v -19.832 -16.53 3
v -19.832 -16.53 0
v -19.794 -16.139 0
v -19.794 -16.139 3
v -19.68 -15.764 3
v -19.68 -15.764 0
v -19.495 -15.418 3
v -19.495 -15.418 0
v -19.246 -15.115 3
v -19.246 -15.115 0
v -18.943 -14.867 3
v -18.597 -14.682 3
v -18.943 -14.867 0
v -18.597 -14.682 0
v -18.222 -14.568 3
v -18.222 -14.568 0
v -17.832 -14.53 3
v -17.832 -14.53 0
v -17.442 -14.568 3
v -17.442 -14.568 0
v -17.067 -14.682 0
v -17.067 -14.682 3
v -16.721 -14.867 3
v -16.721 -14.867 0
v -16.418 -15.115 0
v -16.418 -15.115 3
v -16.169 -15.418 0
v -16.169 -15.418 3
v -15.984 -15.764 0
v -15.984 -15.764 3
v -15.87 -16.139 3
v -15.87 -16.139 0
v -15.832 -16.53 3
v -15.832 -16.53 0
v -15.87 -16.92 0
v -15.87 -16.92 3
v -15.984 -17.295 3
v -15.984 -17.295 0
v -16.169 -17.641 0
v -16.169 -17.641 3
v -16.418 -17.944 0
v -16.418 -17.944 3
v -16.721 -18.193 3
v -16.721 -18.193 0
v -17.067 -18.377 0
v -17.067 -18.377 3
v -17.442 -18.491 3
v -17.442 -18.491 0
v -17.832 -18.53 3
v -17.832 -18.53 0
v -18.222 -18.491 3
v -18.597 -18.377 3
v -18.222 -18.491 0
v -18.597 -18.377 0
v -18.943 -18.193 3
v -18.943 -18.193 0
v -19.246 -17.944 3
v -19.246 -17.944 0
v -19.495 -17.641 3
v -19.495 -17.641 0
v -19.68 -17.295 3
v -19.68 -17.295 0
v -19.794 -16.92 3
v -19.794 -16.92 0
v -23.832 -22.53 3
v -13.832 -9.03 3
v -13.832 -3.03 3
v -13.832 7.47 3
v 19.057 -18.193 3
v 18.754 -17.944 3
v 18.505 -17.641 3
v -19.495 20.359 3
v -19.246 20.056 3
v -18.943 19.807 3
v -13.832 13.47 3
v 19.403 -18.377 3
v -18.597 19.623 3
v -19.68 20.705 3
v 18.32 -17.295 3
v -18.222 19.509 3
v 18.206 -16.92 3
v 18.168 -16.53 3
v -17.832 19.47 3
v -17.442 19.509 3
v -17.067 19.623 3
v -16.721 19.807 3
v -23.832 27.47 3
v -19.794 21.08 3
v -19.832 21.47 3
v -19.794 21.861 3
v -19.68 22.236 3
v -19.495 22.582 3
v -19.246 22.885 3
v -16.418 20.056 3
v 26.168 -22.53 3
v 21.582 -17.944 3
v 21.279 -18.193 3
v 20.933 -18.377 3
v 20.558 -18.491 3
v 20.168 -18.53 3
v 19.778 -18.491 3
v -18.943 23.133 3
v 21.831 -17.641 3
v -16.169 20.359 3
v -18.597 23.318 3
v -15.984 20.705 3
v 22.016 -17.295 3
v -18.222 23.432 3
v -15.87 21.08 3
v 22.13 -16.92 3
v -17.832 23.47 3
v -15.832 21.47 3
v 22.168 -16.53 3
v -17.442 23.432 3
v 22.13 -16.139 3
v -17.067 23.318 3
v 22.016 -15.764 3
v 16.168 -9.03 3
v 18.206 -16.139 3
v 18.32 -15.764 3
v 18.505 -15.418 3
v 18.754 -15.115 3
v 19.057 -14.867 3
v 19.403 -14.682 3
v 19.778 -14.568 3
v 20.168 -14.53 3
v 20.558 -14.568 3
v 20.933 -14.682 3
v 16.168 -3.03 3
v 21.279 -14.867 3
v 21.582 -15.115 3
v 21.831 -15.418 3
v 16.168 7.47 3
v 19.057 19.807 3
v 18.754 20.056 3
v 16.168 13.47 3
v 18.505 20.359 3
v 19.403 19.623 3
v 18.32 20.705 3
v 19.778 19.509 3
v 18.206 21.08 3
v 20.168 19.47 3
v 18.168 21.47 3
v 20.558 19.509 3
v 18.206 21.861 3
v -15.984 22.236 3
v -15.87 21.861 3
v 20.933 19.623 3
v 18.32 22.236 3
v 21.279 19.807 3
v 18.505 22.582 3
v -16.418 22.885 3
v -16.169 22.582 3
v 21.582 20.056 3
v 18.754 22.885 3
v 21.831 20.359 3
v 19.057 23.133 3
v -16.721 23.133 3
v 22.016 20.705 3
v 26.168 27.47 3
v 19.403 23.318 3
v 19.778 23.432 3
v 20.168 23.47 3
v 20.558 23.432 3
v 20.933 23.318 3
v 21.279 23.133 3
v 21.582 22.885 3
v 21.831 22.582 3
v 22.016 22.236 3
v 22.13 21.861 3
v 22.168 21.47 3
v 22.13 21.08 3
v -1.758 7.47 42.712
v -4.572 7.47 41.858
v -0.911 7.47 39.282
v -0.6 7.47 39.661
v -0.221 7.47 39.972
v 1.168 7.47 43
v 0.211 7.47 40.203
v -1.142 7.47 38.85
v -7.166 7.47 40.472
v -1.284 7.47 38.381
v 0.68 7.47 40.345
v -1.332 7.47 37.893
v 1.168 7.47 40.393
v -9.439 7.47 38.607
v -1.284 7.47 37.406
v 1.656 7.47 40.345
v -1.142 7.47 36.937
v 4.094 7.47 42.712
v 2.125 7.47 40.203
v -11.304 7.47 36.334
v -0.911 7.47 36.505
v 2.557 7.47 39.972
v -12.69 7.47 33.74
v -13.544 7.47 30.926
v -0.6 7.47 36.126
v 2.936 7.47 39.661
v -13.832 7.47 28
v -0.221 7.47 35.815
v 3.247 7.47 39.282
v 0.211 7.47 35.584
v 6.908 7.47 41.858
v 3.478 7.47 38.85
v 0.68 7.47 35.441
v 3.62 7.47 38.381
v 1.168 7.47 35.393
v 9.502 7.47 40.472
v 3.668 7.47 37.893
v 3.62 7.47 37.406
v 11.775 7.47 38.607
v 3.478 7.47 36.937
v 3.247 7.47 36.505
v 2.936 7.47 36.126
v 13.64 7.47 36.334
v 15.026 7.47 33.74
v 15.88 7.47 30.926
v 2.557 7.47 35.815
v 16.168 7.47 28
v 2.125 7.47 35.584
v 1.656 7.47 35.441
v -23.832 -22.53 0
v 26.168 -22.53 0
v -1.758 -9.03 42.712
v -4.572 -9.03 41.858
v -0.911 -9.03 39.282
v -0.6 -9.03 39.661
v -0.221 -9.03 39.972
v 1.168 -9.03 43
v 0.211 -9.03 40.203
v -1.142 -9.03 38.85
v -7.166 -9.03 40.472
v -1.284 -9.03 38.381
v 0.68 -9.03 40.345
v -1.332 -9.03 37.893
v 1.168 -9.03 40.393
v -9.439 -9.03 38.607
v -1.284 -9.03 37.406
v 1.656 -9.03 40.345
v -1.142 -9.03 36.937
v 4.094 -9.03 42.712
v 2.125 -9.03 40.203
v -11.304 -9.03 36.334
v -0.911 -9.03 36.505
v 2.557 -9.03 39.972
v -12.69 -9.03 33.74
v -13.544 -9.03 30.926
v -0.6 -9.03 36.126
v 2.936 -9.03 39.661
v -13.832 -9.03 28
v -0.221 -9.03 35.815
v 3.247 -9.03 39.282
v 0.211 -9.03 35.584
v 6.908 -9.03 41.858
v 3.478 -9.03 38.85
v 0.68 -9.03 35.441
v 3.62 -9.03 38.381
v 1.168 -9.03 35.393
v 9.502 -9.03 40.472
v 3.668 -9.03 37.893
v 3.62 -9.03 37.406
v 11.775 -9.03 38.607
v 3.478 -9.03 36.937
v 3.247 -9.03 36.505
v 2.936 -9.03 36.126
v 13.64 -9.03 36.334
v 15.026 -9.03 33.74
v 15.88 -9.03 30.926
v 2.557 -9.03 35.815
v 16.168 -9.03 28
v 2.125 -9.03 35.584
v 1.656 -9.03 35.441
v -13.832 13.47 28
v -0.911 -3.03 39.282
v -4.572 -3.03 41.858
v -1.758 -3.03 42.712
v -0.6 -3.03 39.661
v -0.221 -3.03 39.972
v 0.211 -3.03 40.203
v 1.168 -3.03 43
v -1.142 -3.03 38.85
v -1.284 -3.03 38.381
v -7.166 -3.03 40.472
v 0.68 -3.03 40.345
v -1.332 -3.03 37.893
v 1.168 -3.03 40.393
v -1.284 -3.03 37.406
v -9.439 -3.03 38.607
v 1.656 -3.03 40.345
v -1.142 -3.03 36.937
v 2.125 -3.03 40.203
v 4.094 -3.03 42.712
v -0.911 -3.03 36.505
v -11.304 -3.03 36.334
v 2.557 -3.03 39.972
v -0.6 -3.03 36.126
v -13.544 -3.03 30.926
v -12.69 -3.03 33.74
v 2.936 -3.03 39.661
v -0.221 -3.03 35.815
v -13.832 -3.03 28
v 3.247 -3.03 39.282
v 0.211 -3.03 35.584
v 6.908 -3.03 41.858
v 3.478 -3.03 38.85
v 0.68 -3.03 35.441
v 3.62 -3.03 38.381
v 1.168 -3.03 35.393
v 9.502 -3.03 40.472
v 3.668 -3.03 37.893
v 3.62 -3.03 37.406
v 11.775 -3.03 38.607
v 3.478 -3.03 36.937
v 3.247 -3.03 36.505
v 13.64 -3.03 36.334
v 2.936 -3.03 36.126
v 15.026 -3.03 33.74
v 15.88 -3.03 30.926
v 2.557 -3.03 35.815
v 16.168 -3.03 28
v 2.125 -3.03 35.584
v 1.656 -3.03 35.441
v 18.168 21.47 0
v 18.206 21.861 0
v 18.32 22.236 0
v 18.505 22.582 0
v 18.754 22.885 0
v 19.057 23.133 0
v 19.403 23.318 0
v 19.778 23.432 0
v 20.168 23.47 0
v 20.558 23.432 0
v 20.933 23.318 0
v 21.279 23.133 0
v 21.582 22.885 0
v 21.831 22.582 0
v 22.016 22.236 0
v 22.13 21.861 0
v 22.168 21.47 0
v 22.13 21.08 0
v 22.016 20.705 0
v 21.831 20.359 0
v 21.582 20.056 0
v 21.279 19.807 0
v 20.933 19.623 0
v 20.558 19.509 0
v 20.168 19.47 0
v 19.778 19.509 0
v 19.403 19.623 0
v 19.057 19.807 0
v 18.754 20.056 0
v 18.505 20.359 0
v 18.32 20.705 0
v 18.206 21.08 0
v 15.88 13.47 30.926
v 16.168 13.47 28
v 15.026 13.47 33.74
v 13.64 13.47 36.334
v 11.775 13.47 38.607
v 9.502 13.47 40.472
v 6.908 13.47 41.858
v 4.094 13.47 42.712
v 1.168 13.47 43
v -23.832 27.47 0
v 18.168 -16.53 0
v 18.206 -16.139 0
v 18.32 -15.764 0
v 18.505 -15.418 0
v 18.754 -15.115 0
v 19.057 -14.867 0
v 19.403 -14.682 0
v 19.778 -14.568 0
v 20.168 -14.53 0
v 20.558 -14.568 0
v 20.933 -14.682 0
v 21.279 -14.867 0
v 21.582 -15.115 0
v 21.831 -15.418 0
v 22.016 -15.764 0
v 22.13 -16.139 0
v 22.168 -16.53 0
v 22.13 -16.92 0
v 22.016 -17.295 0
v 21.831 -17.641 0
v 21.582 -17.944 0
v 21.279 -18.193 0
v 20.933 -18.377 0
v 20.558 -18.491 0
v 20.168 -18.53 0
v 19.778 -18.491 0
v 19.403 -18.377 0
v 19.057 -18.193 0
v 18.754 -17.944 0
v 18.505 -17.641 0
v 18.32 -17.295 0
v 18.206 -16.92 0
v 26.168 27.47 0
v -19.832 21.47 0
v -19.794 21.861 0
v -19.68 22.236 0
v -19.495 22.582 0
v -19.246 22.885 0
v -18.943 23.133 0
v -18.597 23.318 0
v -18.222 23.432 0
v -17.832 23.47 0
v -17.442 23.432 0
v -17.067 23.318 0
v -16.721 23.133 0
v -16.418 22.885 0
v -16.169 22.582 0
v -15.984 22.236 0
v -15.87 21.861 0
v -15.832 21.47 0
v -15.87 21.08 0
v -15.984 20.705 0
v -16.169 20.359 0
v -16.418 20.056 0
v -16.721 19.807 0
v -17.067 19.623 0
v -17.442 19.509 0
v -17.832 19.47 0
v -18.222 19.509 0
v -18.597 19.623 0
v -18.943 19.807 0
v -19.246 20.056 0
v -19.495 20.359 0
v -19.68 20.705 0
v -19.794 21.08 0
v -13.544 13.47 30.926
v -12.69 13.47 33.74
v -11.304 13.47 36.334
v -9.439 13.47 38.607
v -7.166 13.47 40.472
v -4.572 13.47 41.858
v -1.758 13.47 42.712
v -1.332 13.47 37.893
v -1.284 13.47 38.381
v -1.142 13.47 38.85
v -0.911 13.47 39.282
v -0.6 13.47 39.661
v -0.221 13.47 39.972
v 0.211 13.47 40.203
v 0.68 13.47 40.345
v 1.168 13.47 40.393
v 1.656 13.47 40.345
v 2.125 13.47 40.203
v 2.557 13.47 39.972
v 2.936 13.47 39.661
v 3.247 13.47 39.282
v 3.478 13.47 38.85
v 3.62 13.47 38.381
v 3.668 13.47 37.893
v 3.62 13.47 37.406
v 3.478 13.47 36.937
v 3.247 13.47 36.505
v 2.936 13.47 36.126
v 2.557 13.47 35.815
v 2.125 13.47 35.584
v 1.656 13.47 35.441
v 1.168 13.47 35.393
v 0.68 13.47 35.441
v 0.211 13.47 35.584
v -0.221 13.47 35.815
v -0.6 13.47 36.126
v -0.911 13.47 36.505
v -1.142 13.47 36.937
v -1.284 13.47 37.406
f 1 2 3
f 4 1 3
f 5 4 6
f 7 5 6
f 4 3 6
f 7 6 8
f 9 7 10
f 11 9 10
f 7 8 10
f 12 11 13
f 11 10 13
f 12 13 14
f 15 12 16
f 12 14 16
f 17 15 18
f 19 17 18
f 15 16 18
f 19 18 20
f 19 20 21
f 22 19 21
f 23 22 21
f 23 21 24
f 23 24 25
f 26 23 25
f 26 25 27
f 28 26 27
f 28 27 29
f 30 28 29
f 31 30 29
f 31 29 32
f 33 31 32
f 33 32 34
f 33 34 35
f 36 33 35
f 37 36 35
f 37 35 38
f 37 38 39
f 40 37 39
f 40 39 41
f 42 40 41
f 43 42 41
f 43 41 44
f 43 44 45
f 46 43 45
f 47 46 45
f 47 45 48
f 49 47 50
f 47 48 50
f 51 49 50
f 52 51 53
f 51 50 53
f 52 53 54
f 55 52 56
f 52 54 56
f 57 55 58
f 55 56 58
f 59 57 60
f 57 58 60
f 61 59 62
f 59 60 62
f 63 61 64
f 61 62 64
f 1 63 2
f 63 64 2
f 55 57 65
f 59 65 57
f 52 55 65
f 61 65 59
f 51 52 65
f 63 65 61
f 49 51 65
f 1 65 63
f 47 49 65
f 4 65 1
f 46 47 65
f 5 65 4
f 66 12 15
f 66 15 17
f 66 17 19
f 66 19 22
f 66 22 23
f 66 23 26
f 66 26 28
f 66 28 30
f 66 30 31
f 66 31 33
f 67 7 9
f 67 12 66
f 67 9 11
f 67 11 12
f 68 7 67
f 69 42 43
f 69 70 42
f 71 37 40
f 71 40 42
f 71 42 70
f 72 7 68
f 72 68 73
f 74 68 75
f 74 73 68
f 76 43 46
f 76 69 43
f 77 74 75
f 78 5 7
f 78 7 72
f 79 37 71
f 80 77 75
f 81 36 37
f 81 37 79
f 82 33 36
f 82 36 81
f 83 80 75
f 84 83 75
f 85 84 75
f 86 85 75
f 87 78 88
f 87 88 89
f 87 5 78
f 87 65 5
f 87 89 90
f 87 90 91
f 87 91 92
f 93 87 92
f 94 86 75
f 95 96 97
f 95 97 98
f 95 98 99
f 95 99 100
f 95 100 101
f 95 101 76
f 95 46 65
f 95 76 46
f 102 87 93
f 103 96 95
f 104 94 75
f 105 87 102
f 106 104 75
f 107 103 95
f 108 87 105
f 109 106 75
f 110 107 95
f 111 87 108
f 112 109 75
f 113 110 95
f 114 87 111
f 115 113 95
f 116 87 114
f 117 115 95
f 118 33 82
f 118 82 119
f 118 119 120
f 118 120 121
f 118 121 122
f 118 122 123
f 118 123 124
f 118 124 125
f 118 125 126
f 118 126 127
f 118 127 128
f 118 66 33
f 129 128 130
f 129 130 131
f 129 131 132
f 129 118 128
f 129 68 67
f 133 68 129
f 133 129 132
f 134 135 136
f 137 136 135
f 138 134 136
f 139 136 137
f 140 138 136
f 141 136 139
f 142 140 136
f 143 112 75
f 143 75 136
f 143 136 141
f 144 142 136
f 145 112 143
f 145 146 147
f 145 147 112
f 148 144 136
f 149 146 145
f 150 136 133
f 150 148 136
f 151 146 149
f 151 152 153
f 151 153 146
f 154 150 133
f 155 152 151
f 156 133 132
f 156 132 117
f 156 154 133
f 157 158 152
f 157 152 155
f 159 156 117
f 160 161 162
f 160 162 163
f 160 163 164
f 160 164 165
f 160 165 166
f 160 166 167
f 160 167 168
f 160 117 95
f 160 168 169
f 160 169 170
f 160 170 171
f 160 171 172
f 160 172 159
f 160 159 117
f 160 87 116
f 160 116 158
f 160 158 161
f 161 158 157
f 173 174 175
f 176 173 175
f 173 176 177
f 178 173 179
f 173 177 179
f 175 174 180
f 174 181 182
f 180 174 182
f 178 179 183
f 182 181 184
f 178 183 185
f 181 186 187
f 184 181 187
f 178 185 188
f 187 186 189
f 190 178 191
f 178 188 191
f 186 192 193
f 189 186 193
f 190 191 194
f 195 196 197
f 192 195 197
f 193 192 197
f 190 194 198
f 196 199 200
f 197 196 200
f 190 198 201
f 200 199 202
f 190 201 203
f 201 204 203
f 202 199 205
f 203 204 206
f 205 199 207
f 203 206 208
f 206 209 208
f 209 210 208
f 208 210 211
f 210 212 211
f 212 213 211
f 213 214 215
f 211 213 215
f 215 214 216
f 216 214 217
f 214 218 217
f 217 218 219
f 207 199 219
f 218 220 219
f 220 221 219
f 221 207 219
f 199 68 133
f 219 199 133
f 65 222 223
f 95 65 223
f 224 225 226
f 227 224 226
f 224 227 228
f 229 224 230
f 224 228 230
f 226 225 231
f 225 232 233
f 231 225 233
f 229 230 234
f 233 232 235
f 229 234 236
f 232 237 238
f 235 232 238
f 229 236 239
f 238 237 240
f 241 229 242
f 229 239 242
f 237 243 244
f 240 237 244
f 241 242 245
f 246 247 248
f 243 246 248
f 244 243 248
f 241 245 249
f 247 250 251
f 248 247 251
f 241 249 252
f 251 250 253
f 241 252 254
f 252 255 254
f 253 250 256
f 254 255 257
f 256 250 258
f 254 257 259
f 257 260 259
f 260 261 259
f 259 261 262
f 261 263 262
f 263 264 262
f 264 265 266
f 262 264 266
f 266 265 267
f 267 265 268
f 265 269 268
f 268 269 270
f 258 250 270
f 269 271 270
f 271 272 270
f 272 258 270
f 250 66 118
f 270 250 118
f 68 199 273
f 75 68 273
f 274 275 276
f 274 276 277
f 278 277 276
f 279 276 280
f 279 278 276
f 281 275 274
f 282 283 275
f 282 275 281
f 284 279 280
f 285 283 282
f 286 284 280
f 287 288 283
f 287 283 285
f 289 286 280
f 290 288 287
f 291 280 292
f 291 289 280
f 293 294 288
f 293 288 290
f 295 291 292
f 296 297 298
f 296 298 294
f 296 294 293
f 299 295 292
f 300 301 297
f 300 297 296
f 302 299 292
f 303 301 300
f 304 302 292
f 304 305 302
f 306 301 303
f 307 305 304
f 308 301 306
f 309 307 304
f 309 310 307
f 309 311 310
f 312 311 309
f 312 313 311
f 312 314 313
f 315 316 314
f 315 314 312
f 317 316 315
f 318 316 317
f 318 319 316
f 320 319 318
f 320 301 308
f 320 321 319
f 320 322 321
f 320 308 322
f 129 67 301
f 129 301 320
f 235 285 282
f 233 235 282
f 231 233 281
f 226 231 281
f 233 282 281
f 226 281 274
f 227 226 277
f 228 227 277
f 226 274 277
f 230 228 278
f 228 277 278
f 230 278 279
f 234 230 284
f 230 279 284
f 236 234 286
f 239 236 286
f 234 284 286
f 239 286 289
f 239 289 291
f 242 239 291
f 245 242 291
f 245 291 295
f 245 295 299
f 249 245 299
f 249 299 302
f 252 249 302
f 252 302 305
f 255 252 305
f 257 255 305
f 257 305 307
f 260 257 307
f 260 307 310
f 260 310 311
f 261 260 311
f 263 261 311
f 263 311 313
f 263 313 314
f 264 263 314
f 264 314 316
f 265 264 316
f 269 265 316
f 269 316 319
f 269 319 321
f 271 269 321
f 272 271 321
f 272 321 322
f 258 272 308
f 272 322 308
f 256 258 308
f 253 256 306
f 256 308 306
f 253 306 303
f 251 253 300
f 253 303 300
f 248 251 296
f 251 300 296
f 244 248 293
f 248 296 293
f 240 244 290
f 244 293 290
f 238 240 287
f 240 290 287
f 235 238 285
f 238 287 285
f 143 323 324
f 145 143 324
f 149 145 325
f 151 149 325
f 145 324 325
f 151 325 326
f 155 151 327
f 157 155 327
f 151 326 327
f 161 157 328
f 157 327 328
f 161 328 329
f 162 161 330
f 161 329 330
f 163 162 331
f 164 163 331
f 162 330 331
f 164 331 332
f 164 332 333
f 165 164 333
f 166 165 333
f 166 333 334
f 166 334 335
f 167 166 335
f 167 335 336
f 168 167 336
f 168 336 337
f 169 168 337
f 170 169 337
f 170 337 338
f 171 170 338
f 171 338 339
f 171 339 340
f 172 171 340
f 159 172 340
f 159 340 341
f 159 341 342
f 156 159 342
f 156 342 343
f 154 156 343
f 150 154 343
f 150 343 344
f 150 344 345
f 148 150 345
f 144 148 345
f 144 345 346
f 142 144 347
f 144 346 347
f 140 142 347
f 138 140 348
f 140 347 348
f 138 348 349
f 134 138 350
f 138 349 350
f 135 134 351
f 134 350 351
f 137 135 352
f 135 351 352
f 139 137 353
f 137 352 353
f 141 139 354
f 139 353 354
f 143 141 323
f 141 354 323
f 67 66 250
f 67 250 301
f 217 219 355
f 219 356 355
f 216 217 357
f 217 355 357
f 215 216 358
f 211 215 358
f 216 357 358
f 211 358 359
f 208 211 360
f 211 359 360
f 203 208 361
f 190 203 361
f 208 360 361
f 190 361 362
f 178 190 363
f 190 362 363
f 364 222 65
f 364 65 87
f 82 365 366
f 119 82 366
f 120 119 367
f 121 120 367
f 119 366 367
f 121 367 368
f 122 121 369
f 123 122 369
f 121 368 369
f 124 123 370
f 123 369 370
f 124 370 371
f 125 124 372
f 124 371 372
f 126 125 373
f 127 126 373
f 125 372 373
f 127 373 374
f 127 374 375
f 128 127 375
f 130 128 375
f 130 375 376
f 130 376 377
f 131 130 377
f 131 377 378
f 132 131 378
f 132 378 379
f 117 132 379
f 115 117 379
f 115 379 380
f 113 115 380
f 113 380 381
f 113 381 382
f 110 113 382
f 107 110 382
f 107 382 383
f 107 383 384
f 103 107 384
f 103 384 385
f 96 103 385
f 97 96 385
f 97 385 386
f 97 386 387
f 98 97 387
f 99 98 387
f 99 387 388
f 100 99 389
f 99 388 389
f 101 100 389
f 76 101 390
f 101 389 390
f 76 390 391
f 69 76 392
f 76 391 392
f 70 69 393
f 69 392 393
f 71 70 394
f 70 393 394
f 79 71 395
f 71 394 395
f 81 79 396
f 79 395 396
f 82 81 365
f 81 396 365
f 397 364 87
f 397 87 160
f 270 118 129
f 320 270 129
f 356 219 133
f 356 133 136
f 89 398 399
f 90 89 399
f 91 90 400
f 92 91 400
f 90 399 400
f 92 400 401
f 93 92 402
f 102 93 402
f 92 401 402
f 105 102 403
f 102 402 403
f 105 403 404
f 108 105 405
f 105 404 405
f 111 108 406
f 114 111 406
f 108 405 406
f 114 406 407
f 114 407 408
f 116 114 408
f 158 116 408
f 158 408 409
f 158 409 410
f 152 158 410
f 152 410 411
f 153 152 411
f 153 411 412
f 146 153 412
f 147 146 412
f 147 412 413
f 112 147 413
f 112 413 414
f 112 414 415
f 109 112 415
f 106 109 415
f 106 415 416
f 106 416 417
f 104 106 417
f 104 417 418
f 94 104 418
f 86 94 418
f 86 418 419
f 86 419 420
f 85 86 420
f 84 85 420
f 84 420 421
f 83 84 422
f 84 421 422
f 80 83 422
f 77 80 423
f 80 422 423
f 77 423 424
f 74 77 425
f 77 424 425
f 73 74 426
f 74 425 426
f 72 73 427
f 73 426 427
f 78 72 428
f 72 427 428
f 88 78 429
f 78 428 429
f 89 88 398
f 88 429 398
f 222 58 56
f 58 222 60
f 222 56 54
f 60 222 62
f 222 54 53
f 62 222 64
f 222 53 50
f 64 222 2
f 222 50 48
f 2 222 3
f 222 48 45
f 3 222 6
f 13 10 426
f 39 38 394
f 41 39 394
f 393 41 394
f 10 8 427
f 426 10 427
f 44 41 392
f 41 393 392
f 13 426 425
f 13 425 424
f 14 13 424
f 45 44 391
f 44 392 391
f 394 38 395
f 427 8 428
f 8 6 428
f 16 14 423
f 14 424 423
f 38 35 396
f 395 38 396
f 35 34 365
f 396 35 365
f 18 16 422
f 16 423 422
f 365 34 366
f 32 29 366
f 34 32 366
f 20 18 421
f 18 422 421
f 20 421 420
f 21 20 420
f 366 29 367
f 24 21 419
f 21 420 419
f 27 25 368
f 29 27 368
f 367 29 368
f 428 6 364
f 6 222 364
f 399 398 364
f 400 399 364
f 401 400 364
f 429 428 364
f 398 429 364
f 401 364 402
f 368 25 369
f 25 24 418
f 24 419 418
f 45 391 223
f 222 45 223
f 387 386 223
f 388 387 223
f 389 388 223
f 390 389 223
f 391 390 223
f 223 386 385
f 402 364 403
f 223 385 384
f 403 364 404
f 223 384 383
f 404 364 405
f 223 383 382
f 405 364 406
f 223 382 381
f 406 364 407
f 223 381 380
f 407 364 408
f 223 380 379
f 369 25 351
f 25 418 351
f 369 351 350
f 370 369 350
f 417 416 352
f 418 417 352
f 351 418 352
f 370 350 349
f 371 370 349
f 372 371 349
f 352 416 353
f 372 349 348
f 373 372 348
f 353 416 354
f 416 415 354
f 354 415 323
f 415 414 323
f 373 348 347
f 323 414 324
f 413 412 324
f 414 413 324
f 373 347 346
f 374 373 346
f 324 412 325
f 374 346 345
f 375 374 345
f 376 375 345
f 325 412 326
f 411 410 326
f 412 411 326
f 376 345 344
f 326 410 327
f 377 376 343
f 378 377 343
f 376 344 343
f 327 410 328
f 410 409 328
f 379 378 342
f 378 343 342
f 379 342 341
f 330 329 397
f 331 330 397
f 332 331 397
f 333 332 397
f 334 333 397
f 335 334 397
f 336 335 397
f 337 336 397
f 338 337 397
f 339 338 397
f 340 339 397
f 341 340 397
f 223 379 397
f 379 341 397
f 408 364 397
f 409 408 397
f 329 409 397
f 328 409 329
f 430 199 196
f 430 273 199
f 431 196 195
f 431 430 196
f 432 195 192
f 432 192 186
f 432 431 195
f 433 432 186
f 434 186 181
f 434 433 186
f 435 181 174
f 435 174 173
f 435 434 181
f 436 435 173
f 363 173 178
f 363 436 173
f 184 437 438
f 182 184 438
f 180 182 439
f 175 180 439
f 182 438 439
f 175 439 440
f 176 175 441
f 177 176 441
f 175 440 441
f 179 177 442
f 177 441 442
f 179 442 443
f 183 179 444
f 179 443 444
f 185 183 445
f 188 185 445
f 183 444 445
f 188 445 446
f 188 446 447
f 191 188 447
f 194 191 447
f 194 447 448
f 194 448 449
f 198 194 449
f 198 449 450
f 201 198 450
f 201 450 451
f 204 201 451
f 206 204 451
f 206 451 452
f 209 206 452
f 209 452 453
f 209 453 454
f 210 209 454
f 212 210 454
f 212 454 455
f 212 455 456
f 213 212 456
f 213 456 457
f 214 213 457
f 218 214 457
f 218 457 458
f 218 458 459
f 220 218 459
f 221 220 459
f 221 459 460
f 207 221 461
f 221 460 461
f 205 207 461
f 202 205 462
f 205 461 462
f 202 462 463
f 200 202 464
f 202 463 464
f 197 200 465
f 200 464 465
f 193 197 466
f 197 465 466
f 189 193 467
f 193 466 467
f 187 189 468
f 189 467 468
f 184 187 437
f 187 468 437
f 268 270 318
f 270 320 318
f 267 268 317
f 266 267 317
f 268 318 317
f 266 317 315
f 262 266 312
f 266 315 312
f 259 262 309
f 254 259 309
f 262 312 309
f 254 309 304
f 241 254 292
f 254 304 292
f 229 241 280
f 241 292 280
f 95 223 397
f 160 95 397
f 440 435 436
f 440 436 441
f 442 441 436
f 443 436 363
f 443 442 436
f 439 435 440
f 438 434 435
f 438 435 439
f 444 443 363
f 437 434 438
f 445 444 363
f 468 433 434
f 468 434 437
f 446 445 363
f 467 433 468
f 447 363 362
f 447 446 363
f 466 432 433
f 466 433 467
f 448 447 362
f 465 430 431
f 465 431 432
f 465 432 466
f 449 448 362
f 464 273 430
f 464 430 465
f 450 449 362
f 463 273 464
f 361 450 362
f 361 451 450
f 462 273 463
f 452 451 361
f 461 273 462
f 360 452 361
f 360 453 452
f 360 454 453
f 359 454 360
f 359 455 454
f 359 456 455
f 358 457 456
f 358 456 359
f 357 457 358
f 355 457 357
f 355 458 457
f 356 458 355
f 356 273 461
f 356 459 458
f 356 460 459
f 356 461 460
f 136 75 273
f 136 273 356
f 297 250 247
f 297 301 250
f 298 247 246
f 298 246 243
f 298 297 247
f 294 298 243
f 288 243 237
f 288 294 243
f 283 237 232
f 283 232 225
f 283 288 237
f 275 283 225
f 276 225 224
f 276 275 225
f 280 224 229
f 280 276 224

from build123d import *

# Parameters (mm, degrees)
F0_W      = 50
F0_H      = 50
F1_DEPTH  = 3
F2_W      = 30
F2_H      = 6
F3_DEPTH  = 40
F4_W      = 30
F4_H      = 6
F5_DEPTH  = 40
F6_R      = 14.99999
F7_R      = 14.99999
F9_D      = 5
F12_D     = 4
F12_DEPTH = 15
F12_TIP   = 1.2017212381


# Not quite as in the source:
# - a fillet or chamfer is up to 0.001 mm smaller than in the source, because OpenCascade refuses the exact size


with BuildPart() as f1:
    # F0 (on Top) → F1 (new body)
    with BuildSketch(Plane.XY):
        with Locations((1.1680303141, 2.4703653681)):
            Rectangle(F0_W, F0_H)
    extrude(amount=F1_DEPTH)

    # F2 (on face) → F3 (join)
    with BuildSketch(Plane.XY.offset(3)):
        with Locations((1.1680303141, -6.0296346319)):
            Rectangle(F2_W, F2_H)
    extrude(amount=F3_DEPTH)

    # F4 (on face) → F5 (join)
    with BuildSketch(Plane.XY.offset(3)):
        with Locations((1.1680303141, 10.4703653681)):
            Rectangle(F4_W, F4_H)
    extrude(amount=F5_DEPTH)

    # F6 (radius 15 in the source; OpenCascade refuses exactly that, so slightly less here)
    f6_edges = [f1.edges().sort_by_distance(p)[0] for p in [
        (-13.83197, -6.029635, 43),
        (16.16803, -6.029635, 43),
    ]]
    fillet(f6_edges, radius=F6_R)

    # F7 (radius 15 in the source; OpenCascade refuses exactly that, so slightly less here)
    f7_edges = [f1.edges().sort_by_distance(p)[0] for p in [
        (16.16803, 10.470365, 43),
        (-13.83197, 10.470365, 43),
    ]]
    fillet(f7_edges, radius=F7_R)

    # F9 (through all)
    with Locations(Plane.XZ.offset(9.0296346319)):
        with Locations((1.1680303141, 37.8934629261)):
            Hole(F9_D / 2)

    # F12
    with Locations(Plane.XY.offset(3)):
        with Locations((-17.8319696859, 21.4703653681), (20.1680303141, 21.4703653681), (20.1680303141, -16.5296346319), (-17.8319696859, -16.5296346319)):
            Hole(F12_D / 2, depth=F12_DEPTH)
            with Locations((0, 0, -(F12_DEPTH + F12_TIP / 2))):  # 118° drill point
                Cone(0, F12_D / 2, F12_TIP, mode=Mode.SUBTRACT)


solid = f1.part
